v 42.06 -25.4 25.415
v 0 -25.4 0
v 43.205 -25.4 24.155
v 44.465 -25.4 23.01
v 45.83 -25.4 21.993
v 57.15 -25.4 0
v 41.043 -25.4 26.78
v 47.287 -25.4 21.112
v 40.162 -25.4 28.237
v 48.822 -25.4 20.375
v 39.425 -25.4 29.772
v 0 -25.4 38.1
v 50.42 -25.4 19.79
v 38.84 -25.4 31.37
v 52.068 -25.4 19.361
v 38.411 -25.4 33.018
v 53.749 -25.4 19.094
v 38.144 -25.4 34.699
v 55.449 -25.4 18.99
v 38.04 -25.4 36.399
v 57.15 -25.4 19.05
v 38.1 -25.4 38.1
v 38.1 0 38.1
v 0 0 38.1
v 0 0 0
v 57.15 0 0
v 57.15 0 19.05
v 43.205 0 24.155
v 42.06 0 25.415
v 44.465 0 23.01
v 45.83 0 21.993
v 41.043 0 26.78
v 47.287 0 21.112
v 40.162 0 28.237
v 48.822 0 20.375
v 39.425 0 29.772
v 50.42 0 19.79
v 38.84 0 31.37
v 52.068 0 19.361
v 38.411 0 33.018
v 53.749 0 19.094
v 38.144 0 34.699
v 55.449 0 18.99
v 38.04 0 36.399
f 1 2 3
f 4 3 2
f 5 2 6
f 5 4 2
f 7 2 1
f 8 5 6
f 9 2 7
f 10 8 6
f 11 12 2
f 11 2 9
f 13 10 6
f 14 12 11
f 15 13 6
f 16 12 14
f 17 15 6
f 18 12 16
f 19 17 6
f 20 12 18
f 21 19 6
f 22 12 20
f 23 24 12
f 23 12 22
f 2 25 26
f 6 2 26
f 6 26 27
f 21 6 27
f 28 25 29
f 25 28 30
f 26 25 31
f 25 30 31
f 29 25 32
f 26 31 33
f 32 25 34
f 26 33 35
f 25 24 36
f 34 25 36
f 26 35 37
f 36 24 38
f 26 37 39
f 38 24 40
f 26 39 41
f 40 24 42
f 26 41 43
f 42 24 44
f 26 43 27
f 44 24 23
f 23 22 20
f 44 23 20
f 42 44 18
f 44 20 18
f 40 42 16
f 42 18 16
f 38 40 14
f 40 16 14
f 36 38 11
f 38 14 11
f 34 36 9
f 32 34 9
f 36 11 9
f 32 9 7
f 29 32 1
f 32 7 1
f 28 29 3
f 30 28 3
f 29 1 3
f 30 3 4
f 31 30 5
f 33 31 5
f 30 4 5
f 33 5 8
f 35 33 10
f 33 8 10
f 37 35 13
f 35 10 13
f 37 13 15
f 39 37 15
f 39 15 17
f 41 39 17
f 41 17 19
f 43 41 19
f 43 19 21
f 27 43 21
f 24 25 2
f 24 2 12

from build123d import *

# Parameters (mm, degrees)
F0_W     = 57.15
F0_H     = 38.1
F1_DEPTH = 25.4
F3_DEPTH = 25.4
F4_W     = 15.0772607885
F4_H     = 19.0978627652
F5_DEPTH = 107
F7_DEPTH = 107
F8_W     = 12.6649001613
F8_H     = 19.2988961935
F9_DEPTH = 107


# Not quite as in the source:
# - an extrude ends at something that could not be found from the text; its depth is read off the source's solid


with BuildPart() as f1:
    # F0 (on Front) → F1 (new body)
    with BuildSketch(Plane.XZ):
        with Locations((28.575, 19.05)):
            Rectangle(F0_W, F0_H)
    extrude(amount=F1_DEPTH)

    # F2 (on face) → F3 (cut)
    with BuildSketch(Plane.XZ.offset(25.4)):
        with BuildLine():
            Line((57.15, 38.1), (38.1, 38.1))
            ThreePointArc((38.1, 38.1), (43.2045261365, 24.1545261365), (57.15, 19.05))
            Line((57.15, 19.05), (57.15, 38.1))
        make_face()
    extrude(amount=-F3_DEPTH, mode=Mode.SUBTRACT)

    # F4 (on Right) → F5 (cut, through all)
    with BuildSketch(Plane.YZ):
        with Locations((-12.0618094224, 28.9483414963)):
            Rectangle(F4_W, F4_H)
    extrude(amount=-F5_DEPTH, mode=Mode.SUBTRACT)

    # F6 (on Right) → F7 (cut, through all)
    with BuildSketch(Plane.YZ):
        Polygon((-6.7345094867, 37.8941856325), (-18.3942597359, 38.2962450385), (-18.3942597359, 24.6261935681), (-6.7345094867, 24.6261935681), align=None)
    extrude(amount=-F7_DEPTH, mode=Mode.SUBTRACT)

    # F8 (on Right) → F9 (cut, through all)
    with BuildSketch(Plane.YZ):
        with Locations((-11.2576889805, 28.6467969418)):
            Rectangle(F8_W, F8_H)
    extrude(amount=-F9_DEPTH, mode=Mode.SUBTRACT)


solid = f1.part
